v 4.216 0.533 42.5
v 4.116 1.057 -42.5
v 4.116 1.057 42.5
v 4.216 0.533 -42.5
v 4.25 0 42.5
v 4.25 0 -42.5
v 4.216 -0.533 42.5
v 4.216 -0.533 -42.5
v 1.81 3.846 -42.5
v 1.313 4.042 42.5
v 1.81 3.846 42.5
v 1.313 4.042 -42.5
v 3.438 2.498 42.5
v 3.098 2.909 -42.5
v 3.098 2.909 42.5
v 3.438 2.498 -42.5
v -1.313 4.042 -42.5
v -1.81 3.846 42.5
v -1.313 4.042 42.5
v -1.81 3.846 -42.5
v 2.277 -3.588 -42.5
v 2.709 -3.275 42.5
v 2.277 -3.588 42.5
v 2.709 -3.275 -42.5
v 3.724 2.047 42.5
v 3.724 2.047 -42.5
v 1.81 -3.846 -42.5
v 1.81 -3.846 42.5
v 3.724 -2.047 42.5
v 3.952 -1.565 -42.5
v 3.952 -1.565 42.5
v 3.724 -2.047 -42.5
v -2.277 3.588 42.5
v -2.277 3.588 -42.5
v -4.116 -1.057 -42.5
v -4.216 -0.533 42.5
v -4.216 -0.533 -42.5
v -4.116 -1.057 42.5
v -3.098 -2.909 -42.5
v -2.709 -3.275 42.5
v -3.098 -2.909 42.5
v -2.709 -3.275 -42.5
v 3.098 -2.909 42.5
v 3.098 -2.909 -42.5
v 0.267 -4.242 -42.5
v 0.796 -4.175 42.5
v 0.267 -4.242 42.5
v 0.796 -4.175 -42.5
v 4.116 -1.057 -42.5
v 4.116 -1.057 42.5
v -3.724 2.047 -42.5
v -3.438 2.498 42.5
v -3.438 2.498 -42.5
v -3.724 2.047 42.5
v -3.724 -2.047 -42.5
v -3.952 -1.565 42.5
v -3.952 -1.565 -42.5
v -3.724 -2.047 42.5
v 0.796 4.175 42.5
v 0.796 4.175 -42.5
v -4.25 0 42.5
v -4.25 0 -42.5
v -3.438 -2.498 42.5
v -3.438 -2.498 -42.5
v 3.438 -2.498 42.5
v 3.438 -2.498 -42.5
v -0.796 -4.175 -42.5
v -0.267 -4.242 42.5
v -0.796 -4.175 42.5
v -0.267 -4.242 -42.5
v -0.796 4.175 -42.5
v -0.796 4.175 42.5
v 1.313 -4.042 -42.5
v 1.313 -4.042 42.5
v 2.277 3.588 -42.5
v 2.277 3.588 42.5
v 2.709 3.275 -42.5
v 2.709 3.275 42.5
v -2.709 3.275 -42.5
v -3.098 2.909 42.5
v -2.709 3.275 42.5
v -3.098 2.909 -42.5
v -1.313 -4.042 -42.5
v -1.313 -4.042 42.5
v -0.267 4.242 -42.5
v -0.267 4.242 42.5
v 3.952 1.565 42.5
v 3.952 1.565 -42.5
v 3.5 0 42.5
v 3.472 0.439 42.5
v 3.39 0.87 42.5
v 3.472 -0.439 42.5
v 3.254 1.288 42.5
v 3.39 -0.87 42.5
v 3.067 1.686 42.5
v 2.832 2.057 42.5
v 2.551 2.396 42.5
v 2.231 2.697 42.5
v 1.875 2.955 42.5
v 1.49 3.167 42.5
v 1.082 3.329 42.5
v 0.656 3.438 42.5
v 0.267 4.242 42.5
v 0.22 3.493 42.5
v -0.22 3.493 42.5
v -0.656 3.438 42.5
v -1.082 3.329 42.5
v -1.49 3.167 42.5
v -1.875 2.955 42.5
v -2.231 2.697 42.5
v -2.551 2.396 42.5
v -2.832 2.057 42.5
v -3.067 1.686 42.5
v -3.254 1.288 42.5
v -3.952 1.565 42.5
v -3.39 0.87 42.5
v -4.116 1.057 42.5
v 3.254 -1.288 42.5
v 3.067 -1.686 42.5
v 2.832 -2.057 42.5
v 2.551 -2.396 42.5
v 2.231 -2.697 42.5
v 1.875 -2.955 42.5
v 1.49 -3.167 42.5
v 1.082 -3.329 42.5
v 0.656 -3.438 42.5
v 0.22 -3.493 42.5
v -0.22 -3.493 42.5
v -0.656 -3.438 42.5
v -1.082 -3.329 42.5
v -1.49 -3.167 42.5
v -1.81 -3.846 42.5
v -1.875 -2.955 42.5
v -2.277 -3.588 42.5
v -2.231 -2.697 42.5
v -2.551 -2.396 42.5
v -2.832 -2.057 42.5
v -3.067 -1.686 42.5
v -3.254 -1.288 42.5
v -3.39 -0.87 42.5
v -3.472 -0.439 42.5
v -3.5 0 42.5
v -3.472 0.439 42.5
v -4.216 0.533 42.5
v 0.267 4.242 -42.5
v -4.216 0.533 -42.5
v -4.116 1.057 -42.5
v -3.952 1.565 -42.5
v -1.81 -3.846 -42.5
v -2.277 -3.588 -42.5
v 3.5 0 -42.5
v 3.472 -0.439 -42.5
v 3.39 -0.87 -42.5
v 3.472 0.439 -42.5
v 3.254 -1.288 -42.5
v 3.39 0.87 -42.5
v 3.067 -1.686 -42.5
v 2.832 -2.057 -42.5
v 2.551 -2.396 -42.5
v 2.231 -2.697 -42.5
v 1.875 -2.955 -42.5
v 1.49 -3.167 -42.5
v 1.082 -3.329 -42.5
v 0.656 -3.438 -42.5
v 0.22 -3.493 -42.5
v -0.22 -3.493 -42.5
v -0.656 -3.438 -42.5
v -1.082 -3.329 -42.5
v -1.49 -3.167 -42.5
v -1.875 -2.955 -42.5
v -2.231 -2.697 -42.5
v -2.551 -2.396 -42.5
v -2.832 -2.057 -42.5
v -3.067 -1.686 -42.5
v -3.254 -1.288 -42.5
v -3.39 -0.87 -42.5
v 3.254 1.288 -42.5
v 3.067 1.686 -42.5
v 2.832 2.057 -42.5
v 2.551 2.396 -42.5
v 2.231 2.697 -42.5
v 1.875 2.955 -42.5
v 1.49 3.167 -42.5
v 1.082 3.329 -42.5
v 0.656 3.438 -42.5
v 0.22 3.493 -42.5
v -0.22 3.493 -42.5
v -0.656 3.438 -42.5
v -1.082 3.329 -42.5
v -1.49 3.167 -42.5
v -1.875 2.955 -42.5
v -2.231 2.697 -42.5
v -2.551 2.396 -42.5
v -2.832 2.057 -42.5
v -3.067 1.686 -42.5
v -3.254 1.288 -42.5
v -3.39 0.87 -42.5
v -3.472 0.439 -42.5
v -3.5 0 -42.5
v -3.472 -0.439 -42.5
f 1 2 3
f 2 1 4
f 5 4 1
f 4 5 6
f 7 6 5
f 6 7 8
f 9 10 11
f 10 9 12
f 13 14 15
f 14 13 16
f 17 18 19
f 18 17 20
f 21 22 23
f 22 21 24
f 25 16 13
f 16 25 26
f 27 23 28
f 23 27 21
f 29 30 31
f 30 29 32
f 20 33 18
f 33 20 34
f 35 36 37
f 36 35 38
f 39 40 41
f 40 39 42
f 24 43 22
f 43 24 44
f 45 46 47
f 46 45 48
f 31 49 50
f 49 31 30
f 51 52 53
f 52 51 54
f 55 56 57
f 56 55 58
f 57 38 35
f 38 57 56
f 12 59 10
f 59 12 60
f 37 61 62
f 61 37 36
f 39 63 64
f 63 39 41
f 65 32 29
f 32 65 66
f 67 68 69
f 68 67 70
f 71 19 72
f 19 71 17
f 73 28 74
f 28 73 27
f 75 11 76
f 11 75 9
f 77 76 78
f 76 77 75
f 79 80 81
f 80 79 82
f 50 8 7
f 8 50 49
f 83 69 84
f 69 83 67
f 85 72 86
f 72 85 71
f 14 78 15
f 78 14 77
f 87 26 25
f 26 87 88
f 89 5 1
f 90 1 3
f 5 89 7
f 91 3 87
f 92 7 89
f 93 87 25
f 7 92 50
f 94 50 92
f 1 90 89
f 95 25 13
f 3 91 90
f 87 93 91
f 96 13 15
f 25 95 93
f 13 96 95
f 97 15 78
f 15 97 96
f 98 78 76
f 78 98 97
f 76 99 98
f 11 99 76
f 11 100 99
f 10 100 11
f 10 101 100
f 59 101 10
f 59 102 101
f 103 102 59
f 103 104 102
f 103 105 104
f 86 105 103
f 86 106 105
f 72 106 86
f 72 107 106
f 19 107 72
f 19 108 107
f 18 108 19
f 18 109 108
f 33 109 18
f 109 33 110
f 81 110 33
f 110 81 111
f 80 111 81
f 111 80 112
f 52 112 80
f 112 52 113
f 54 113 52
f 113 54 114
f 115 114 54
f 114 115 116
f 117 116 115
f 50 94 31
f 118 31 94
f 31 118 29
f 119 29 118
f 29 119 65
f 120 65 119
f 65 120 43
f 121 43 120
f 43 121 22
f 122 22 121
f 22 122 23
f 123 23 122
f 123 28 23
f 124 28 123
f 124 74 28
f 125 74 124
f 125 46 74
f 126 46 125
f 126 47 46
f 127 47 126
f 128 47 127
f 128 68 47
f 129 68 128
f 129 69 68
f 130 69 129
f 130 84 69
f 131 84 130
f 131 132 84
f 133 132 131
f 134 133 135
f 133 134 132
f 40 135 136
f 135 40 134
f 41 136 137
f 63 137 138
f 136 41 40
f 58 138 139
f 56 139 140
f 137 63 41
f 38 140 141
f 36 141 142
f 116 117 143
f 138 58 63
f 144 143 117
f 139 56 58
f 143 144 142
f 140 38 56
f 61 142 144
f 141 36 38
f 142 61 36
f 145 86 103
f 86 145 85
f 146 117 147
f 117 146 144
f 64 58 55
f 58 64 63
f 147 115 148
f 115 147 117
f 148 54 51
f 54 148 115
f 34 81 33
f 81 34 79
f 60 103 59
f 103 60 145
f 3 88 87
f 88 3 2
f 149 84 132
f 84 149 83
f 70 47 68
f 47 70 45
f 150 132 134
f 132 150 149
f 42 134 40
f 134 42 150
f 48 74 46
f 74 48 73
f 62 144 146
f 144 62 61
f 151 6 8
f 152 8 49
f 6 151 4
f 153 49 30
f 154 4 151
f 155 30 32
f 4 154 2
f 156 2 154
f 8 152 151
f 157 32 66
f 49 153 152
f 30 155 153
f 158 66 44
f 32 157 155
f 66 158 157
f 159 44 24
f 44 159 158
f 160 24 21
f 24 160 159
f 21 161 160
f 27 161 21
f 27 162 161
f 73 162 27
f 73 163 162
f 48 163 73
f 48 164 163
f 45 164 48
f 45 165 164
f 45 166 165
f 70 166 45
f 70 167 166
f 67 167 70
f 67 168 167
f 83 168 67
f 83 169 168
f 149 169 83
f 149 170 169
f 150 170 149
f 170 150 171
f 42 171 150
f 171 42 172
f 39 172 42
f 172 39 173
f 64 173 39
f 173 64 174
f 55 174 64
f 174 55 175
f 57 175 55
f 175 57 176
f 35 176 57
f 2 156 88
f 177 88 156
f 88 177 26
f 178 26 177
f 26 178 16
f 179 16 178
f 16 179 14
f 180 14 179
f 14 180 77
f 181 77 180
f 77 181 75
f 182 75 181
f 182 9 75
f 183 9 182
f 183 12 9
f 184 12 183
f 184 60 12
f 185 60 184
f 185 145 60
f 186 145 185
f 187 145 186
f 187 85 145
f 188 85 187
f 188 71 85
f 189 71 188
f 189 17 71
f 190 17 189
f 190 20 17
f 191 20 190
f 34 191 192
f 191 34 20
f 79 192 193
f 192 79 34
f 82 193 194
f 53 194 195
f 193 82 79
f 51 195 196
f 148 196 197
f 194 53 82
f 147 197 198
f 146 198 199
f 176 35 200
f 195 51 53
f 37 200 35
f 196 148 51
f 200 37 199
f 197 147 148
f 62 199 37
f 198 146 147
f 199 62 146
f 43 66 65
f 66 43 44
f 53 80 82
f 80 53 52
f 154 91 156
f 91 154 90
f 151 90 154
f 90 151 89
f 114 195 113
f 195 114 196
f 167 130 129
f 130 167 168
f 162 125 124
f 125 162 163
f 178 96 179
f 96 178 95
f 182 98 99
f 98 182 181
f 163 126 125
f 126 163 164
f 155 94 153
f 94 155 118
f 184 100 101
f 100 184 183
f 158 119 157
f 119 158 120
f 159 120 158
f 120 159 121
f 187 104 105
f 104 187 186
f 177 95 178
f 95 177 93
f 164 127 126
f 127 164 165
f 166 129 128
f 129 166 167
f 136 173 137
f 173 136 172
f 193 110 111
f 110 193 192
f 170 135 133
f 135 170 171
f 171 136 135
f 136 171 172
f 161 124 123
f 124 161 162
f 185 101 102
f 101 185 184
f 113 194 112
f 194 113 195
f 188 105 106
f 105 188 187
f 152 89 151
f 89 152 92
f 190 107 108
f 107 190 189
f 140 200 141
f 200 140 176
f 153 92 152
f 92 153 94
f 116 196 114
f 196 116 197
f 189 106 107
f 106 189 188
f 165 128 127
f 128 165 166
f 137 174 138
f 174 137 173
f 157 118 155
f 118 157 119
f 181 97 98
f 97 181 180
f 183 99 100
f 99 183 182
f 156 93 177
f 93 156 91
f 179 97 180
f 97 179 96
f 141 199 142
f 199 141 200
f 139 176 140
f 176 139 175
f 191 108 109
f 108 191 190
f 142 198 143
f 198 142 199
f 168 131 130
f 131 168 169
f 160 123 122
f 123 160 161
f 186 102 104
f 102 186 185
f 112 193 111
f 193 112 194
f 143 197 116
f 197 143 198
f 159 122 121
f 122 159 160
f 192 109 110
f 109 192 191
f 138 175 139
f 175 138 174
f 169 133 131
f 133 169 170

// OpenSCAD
$fn = 50;


difference() {
	union() {
		translate(v = [0, 0, -42.5000000000]) {
			cylinder(h = 85, r = 4.2500000000);
		}
	}
	union() {
		translate(v = [0, 0, -100.0000000000]) {
			cylinder(h = 200, r = 3.5000000000);
		}
	}
}
